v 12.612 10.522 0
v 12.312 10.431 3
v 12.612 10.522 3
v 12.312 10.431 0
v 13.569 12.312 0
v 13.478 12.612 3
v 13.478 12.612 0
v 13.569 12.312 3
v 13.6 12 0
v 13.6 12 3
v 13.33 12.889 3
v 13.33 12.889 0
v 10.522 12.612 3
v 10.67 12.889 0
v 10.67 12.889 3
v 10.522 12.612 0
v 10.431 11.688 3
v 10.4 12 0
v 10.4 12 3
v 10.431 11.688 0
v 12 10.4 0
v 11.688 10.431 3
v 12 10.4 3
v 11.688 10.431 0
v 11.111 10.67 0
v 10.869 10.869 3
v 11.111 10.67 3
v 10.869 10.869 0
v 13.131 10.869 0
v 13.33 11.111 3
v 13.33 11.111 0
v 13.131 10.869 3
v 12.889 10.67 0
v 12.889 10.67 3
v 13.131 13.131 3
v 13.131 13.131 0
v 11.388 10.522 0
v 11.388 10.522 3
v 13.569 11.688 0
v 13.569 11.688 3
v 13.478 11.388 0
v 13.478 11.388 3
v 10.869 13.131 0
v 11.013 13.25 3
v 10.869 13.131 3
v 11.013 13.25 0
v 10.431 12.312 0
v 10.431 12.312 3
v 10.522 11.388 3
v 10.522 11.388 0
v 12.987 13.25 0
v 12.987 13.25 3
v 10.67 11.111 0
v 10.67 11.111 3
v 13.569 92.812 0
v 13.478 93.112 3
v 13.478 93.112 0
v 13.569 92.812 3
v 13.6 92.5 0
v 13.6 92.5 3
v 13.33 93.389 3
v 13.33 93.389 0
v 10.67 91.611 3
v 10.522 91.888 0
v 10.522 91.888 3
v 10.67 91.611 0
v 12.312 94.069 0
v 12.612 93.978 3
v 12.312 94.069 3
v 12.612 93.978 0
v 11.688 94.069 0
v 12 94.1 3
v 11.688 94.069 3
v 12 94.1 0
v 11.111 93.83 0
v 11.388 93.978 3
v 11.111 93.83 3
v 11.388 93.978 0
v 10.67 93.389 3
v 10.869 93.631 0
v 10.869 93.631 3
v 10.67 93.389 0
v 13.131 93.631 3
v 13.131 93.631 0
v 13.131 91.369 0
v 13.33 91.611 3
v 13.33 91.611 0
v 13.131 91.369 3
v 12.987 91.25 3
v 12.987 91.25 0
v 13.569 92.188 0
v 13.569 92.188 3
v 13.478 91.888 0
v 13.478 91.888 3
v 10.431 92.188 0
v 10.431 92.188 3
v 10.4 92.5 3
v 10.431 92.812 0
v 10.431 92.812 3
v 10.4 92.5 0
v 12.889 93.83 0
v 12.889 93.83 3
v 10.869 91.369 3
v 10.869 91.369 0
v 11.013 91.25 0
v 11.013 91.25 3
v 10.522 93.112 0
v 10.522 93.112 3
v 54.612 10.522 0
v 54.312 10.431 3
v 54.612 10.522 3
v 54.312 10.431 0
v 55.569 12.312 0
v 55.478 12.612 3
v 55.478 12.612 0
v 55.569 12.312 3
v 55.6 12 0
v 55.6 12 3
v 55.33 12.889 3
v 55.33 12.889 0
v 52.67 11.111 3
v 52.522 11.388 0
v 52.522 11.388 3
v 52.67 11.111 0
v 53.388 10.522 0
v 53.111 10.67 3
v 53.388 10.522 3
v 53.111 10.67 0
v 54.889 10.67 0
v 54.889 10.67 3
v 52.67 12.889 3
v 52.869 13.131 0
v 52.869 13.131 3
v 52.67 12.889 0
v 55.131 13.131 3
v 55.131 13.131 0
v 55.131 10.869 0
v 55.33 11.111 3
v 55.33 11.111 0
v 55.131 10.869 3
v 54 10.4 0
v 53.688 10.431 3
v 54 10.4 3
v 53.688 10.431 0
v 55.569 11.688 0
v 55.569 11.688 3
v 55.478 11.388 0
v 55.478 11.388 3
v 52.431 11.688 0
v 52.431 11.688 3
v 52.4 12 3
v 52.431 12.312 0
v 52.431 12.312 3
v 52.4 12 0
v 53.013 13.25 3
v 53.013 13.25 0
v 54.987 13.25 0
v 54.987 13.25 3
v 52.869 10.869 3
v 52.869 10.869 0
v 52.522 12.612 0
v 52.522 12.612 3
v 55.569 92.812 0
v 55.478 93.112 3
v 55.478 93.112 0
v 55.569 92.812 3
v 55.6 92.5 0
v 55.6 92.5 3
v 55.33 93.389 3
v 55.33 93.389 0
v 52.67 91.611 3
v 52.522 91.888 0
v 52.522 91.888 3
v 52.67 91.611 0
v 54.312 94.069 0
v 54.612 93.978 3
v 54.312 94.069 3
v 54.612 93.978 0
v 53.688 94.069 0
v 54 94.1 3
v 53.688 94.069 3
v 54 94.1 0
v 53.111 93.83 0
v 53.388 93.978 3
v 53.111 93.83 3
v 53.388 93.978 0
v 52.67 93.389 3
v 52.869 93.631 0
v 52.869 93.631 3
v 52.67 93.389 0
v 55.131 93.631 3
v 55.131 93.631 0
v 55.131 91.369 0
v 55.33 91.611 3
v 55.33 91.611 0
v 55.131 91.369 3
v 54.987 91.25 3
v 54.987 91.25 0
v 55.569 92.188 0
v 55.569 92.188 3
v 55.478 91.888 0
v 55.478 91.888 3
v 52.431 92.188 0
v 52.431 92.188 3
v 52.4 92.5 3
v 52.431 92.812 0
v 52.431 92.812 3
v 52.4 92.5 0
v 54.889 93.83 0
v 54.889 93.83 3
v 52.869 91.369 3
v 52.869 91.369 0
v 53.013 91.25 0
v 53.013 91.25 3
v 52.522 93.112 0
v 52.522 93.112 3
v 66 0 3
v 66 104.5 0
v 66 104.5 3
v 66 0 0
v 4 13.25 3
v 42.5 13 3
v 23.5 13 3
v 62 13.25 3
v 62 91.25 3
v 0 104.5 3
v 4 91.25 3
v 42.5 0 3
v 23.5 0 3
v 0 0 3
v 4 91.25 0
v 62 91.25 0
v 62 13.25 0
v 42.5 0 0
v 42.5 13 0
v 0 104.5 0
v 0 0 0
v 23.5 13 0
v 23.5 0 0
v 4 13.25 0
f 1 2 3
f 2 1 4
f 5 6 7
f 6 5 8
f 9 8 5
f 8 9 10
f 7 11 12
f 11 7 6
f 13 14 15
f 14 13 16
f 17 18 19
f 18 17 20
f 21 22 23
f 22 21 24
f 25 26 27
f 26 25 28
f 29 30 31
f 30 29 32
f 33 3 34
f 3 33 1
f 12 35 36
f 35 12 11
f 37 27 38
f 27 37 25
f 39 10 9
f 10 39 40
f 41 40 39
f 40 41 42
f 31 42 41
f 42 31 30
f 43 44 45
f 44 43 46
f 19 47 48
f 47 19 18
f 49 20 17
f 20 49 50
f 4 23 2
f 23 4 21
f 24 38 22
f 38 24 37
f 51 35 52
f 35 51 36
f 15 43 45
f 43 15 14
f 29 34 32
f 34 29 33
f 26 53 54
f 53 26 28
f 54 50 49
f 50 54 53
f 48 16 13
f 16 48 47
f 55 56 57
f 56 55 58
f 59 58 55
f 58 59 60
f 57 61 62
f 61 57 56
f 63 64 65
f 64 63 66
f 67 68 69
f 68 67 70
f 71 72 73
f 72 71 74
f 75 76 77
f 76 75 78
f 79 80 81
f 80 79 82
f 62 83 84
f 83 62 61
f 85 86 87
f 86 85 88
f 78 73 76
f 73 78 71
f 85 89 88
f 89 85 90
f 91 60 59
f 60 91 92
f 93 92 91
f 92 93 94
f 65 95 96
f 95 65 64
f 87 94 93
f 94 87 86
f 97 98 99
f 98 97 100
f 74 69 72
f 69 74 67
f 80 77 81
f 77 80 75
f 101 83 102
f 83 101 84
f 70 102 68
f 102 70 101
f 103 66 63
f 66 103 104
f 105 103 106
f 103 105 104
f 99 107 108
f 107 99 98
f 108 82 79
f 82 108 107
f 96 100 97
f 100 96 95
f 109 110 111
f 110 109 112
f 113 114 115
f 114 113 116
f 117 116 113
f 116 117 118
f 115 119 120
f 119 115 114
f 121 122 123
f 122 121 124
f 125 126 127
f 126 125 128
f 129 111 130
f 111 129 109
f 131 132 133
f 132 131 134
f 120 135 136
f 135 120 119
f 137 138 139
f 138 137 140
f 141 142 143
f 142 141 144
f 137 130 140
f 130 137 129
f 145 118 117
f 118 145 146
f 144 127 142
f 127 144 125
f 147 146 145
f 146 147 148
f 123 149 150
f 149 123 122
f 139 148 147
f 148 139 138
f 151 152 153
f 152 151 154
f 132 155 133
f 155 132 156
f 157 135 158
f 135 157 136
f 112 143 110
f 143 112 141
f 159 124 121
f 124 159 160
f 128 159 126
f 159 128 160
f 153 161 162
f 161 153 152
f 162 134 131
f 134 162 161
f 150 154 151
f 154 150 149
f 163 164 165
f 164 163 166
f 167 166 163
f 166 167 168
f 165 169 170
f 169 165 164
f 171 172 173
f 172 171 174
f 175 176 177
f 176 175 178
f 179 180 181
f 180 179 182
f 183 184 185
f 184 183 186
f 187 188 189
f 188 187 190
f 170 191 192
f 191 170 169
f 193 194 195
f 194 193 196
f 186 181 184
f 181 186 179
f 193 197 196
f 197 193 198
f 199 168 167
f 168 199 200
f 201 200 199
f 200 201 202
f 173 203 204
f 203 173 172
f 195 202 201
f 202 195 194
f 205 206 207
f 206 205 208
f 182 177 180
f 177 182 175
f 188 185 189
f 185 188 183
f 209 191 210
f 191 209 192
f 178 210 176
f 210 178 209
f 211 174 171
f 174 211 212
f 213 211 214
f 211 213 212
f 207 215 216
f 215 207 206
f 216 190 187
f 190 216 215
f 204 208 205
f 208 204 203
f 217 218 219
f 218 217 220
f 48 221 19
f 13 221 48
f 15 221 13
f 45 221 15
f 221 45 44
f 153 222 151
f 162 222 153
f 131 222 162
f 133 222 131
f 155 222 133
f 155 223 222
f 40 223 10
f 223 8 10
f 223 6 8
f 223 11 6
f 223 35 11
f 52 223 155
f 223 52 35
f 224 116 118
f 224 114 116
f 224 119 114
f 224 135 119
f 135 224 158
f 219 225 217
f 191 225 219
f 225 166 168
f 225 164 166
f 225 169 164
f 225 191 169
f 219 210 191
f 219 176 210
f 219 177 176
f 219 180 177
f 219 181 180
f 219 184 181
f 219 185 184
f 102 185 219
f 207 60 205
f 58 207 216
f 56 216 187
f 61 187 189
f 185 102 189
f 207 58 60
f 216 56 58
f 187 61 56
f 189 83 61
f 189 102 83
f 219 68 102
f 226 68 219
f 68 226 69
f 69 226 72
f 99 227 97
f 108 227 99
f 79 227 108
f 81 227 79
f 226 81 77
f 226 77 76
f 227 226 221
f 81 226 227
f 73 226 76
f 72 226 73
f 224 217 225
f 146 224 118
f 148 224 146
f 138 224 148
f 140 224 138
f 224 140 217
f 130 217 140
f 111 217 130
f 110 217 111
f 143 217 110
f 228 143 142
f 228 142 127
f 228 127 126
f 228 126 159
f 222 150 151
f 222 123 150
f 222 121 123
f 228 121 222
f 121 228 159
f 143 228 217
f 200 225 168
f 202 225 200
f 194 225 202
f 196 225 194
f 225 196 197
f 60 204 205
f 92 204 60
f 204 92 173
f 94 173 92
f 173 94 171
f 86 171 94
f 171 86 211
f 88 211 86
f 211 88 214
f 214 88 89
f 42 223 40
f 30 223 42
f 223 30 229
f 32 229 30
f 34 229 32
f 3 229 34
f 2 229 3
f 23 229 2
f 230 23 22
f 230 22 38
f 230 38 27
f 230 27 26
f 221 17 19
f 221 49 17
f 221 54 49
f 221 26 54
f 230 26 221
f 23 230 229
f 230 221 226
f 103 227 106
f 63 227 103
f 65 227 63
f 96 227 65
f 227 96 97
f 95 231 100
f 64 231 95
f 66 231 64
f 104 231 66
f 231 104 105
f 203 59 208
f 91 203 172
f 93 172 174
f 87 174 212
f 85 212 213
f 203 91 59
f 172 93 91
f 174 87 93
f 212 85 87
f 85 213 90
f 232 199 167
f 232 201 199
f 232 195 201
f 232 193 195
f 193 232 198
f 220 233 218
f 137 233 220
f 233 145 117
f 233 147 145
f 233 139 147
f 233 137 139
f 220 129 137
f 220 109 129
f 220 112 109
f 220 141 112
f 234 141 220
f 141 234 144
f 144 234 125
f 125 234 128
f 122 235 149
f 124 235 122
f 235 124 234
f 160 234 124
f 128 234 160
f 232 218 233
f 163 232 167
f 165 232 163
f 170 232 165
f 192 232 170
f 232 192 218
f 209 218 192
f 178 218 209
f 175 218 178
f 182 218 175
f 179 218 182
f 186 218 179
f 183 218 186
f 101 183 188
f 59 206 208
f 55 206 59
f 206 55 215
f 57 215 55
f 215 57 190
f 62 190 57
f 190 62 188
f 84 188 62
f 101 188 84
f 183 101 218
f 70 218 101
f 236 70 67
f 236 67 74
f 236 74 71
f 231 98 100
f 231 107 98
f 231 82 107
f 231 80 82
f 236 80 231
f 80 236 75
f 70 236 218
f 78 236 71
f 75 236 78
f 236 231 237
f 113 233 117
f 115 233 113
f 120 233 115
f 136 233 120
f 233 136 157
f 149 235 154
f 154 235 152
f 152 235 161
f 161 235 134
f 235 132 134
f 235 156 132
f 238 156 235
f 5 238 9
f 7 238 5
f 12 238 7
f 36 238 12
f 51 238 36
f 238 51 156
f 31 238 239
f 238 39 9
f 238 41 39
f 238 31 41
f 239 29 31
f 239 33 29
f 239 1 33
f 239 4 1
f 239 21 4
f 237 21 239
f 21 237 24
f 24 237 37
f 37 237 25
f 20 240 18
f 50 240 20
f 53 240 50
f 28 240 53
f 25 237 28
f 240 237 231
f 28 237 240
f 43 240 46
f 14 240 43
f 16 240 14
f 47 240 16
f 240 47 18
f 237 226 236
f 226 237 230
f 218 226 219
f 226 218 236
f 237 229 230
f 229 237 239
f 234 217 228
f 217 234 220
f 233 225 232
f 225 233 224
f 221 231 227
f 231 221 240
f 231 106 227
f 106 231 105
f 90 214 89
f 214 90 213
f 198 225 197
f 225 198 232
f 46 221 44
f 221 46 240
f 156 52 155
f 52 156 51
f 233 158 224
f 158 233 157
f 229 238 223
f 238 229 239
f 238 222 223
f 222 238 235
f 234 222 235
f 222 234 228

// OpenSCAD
// Cheap fit coupon for Rugged A1.
// STATUS: must be parameterized from caliper measurements before export.
// This is intentionally not the final enclosure.

// PHOTO_ESTIMATE: supplied photographs only; replace with caliper values.
tft_hole_spacing_x = 42.0; // transverse spacing MEASURE_REQUIRED
tft_hole_spacing_y = 80.5; // PHOTO_ESTIMATE from supplied ~79–82 mm
tft_hole_d = 3.2;
tft_window_w = 58.0;
tft_window_h = 78.0;
usb_center_spacing = 9.0; // MEASURE_REQUIRED; both ports appear on one end
usb_w = 10.0;
usb_h = 5.0;
plate_t = 3.0;
edge = 12.0;

plate_w = tft_hole_spacing_x + 2*edge;
plate_h = tft_hole_spacing_y + 2*edge;

difference() {
    cube([plate_w, plate_h, plate_t]);
    // TFT mounting-hole test pattern.
    for (x=[edge, edge+tft_hole_spacing_x])
        for (y=[edge, edge+tft_hole_spacing_y])
            translate([x,y,-1]) cylinder(d=tft_hole_d,h=plate_t+2,$fn=32);
    // Active-window test aperture.
    translate([(plate_w-tft_window_w)/2,(plate_h-tft_window_h)/2,-1])
        cube([tft_window_w,tft_window_h,plate_t+2]);
    // Two same-end USB-C gauge slots; position/orientation must be measured.
    translate([(plate_w-usb_center_spacing)/2-usb_w/2, -1, 0]) cube([usb_w,edge+2,usb_h]);
    translate([(plate_w+usb_center_spacing)/2-usb_w/2, -1, 0]) cube([usb_w,edge+2,usb_h]);
}
